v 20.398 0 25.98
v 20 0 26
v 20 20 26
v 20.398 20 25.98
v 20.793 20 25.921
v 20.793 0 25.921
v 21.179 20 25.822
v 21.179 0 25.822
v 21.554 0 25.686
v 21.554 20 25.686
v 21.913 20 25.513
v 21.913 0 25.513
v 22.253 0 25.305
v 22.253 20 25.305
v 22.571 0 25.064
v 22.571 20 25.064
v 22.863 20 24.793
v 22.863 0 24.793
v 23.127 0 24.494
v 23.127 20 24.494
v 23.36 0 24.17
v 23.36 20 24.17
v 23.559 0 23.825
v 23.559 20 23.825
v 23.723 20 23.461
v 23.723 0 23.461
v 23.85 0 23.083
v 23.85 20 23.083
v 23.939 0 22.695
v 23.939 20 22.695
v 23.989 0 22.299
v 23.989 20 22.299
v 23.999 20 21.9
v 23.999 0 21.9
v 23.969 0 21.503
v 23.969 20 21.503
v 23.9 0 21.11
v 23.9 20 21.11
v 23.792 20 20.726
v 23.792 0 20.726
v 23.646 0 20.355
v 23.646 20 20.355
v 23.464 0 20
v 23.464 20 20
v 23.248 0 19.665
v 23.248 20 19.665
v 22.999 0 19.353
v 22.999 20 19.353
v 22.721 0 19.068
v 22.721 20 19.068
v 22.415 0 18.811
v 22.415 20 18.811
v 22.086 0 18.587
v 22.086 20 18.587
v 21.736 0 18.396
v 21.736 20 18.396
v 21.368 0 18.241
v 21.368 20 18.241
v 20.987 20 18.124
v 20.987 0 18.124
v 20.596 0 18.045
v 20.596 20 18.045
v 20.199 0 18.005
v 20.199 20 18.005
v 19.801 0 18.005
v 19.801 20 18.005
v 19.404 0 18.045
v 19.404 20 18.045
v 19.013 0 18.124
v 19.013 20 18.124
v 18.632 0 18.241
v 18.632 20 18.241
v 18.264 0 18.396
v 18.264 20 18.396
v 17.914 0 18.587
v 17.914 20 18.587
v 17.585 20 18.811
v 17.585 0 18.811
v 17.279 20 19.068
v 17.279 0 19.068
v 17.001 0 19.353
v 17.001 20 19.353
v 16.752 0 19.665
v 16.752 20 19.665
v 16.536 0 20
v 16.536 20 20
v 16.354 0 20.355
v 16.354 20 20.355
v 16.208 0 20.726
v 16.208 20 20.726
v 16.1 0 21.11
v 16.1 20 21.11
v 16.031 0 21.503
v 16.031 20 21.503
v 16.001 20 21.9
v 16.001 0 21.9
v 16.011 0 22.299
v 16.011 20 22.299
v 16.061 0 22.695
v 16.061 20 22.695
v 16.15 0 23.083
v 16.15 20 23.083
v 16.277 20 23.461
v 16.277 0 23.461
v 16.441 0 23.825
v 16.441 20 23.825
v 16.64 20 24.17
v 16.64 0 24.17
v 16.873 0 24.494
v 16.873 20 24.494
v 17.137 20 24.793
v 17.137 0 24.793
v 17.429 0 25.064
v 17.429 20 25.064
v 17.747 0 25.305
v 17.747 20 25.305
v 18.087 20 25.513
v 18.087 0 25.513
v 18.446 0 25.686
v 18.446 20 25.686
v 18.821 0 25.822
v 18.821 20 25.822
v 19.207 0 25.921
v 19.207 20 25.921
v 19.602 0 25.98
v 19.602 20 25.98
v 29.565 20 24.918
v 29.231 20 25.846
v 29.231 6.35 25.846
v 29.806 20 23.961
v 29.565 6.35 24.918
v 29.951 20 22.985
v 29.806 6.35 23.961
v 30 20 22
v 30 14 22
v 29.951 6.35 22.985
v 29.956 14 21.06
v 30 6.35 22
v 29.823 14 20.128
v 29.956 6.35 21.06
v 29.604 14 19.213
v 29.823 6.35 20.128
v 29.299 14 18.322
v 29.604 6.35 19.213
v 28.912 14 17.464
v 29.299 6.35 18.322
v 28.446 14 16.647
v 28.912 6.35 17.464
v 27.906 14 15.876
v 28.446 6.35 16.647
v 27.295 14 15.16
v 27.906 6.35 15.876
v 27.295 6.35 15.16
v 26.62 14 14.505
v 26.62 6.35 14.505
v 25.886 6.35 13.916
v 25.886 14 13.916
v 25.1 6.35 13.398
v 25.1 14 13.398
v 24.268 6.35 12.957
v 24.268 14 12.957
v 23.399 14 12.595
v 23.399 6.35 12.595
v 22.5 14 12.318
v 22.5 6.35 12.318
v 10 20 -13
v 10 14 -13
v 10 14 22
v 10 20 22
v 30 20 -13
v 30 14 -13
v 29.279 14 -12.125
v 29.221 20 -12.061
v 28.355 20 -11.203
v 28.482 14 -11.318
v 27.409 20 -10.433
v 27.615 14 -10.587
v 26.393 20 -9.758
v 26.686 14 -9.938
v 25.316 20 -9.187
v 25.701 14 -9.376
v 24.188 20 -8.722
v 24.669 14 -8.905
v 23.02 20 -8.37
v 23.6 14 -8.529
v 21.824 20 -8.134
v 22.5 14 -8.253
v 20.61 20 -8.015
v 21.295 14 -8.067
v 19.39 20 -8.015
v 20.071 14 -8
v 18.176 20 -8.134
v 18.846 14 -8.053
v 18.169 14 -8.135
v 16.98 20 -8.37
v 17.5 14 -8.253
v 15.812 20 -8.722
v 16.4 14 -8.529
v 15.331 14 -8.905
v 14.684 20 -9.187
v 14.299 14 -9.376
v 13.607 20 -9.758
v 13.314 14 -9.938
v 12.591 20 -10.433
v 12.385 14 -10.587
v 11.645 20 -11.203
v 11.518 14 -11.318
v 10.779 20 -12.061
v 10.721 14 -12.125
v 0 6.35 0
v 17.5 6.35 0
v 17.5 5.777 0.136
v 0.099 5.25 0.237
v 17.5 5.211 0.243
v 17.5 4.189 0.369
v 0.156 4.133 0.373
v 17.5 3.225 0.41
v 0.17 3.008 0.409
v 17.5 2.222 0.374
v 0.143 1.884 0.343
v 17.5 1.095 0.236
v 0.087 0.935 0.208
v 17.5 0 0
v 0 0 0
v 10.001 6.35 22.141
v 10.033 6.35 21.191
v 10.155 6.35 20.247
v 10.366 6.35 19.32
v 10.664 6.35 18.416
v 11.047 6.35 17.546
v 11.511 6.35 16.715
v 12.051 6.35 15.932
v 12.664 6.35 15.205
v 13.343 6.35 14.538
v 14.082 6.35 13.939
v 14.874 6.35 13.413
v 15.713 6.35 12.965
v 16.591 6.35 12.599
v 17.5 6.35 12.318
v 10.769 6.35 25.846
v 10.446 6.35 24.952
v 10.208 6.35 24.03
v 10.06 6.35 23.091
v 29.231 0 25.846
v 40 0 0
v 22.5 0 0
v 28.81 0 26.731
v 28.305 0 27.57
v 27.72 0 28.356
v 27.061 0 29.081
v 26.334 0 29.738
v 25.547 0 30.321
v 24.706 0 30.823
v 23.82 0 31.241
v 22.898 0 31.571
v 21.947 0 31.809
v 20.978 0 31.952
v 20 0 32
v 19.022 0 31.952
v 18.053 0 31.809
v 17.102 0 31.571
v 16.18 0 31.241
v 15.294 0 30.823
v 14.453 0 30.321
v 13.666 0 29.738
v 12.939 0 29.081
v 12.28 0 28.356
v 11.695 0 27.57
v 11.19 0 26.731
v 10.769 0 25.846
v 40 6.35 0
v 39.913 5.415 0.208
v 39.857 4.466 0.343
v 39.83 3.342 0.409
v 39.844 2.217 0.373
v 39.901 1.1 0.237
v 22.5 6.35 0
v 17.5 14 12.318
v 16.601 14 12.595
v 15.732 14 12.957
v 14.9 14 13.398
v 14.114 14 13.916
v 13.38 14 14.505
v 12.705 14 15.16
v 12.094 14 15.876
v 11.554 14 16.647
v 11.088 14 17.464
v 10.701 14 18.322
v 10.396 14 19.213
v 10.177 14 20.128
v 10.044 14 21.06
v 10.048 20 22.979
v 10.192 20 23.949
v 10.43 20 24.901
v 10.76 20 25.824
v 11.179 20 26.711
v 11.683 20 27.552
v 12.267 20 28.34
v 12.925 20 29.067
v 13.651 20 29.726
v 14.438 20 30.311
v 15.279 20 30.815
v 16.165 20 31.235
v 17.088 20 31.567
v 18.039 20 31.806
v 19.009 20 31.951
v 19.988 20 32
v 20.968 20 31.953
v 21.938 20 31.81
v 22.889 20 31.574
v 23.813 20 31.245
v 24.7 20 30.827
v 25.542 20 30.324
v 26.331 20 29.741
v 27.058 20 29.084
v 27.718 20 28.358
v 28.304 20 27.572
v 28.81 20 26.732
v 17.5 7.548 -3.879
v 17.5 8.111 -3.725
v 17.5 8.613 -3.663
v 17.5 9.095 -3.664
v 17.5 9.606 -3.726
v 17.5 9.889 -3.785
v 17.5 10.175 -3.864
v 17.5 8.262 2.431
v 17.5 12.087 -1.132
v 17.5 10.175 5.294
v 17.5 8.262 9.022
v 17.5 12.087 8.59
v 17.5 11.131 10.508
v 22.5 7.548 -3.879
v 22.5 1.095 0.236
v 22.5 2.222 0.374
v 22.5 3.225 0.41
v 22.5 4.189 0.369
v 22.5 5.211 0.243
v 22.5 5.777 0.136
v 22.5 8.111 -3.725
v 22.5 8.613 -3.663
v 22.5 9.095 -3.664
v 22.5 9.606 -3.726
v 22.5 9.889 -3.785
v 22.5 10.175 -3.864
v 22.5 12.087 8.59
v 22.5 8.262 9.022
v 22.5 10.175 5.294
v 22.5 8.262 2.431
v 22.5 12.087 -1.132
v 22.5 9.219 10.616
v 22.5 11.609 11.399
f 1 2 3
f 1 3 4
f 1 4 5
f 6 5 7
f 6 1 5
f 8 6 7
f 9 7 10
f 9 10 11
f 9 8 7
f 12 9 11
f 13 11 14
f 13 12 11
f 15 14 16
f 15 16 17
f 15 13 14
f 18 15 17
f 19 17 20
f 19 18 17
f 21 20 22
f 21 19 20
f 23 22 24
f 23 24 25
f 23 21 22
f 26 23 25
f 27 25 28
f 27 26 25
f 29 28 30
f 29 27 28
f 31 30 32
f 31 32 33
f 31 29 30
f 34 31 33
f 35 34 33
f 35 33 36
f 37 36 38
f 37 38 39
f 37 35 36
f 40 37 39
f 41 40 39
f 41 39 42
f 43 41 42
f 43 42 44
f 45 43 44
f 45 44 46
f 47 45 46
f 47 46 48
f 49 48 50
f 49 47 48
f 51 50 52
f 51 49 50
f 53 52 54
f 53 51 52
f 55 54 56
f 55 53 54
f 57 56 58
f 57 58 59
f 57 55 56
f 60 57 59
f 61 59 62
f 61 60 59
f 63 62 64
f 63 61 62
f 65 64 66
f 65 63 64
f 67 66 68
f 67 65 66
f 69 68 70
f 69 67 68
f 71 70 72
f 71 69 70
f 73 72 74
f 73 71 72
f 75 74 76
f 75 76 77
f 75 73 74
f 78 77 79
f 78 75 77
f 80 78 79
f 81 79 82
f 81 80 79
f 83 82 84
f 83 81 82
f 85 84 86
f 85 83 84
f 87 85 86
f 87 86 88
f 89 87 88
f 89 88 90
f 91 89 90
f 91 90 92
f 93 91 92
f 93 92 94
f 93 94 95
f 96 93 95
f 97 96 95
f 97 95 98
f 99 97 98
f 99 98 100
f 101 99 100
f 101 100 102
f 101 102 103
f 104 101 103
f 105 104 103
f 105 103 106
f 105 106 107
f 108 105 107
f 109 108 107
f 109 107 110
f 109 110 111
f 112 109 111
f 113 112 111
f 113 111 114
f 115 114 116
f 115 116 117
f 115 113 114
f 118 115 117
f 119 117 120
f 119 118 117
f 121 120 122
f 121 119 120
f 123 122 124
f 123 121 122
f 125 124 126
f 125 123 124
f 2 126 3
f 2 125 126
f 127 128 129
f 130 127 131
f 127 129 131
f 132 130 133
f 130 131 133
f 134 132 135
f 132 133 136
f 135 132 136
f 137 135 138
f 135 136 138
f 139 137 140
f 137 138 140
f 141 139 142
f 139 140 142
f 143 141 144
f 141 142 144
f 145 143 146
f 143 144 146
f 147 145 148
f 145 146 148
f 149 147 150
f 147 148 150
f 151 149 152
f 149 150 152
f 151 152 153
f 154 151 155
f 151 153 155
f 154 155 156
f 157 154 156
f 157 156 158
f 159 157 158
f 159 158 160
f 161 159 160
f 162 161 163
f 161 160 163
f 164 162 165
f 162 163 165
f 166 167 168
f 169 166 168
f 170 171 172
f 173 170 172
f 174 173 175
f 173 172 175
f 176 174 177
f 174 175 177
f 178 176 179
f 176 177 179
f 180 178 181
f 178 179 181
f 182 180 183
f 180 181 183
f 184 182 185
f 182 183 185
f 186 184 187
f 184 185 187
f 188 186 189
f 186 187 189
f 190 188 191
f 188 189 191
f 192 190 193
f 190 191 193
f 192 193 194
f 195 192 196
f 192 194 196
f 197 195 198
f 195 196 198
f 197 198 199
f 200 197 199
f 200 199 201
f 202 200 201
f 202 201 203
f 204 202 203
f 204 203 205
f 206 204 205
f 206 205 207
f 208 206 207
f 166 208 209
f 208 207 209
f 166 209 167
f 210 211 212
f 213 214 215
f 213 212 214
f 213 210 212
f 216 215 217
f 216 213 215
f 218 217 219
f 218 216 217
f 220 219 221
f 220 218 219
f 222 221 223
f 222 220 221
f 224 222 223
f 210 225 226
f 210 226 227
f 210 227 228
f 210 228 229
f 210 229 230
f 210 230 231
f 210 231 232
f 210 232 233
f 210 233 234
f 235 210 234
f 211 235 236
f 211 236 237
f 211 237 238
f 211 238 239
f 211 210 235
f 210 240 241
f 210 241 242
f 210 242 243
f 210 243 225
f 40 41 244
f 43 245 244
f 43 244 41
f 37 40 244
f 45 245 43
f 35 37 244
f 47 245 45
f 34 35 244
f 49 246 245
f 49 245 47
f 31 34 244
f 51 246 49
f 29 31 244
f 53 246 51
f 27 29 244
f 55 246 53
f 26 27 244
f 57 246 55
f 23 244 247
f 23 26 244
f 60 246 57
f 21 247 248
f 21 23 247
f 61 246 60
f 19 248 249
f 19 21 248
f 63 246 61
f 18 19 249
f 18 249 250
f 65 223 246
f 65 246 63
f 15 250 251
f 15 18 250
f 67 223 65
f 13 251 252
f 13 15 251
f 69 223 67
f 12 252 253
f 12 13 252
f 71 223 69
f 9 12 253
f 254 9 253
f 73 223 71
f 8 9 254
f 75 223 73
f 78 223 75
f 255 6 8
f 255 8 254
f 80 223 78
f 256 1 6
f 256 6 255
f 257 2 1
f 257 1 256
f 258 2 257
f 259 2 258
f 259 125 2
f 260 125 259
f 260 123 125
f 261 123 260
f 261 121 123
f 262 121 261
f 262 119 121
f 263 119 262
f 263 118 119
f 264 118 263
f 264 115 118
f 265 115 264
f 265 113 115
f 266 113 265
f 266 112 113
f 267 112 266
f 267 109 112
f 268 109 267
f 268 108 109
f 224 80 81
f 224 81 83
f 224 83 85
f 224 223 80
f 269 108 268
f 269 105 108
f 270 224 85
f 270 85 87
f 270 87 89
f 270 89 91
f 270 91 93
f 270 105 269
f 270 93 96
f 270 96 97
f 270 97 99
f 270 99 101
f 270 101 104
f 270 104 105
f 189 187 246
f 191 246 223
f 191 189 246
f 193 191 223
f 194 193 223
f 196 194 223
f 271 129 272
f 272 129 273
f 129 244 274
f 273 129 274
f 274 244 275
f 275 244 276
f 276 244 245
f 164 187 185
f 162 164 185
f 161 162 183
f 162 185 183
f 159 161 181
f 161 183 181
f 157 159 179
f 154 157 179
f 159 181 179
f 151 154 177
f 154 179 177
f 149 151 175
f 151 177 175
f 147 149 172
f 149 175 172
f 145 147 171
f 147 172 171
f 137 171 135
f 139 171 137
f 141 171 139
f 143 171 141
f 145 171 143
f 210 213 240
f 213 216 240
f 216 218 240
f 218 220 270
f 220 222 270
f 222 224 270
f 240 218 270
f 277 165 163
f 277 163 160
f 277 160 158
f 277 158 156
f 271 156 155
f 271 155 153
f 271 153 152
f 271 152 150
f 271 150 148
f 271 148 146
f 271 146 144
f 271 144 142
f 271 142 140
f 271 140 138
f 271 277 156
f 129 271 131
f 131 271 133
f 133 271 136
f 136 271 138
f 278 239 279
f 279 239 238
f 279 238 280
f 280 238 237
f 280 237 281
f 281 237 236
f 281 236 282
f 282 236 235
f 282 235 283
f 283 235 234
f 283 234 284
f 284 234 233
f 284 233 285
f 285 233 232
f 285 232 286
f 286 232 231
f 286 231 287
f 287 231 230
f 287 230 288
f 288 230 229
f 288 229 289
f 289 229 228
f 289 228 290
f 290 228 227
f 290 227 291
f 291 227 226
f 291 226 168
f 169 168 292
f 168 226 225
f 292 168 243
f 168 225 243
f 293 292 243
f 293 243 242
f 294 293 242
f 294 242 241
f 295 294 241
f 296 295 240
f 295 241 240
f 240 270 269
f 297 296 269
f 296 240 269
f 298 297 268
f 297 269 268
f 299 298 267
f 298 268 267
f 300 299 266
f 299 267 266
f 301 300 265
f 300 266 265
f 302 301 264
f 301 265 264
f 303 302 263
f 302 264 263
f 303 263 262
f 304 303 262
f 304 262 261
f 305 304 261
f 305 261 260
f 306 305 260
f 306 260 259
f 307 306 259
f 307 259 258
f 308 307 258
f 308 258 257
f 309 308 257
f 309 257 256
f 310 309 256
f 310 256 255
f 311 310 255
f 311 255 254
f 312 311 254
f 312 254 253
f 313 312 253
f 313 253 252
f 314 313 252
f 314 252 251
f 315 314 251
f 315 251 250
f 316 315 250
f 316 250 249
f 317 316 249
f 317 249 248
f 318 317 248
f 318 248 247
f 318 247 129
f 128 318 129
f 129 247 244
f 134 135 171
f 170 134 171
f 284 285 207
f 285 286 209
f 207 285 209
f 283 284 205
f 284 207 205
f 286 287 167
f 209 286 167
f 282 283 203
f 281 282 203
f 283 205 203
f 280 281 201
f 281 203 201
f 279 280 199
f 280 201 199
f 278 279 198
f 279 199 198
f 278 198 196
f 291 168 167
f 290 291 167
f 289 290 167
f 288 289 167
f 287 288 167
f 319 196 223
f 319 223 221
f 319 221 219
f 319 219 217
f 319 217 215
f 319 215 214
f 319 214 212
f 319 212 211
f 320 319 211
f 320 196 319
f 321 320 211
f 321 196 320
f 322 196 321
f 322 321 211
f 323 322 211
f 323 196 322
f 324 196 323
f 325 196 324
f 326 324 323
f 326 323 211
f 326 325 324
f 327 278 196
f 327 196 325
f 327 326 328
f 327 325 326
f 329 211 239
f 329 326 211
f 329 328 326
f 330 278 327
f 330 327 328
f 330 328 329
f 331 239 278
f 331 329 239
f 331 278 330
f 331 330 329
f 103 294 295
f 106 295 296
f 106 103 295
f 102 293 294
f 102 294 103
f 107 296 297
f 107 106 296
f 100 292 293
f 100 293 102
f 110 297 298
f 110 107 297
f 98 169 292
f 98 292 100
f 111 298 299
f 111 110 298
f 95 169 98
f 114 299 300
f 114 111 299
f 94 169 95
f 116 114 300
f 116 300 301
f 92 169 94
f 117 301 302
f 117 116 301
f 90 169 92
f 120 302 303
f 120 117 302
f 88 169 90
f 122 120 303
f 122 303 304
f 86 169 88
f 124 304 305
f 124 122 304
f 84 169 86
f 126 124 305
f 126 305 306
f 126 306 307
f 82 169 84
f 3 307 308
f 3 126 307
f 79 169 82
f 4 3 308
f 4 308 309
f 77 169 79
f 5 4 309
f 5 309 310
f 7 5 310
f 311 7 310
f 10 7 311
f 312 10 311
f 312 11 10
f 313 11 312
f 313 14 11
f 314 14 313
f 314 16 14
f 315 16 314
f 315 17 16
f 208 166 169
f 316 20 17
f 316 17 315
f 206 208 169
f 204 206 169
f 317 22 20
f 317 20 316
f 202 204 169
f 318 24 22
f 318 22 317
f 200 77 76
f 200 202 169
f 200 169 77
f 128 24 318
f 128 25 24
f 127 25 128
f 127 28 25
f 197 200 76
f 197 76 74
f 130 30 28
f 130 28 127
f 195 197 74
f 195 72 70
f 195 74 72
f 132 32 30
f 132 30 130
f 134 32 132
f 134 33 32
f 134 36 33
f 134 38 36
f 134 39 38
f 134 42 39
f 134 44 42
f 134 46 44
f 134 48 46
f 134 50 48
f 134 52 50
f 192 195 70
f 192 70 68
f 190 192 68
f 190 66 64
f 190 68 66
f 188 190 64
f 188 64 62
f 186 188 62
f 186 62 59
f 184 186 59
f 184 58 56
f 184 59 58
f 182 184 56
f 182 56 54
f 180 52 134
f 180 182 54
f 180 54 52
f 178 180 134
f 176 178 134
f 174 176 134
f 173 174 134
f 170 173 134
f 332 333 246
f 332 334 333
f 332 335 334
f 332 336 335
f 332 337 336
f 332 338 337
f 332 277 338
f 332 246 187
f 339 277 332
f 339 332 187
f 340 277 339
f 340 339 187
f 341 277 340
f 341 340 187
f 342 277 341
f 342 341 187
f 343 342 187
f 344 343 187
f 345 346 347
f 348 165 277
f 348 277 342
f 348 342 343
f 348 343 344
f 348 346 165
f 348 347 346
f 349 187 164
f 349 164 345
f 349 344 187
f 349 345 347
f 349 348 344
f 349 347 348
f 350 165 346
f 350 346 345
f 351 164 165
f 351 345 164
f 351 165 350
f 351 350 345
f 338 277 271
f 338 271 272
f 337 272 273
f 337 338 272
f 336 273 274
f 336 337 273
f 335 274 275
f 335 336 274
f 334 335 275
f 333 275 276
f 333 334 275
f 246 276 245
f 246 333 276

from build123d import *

# Parameters (mm, degrees)
BOSS_EXTRUDE1_DEPTH = 6.35
SKETCH1_3_R         = 4
BOSS_EXTRUDE2_DEPTH = 20
SKETCH2_R           = 12.5
CUT_EXTRUDE1_DEPTH  = 55.990908339
BOSS_EXTRUDE3_START = -6
BOSS_EXTRUDE3_DEPTH = 6


with BuildPart() as part:
    # Sketch1 → Boss-Extrude1 (new body)
    with BuildSketch(Plane(origin=(0, 0, 0), x_dir=(1, 0, 0), z_dir=(0, 1, 0))):
        with BuildLine():
            Line((40, 0), (0, 0))
            Line((0, 0), (10.769230769, -25.846153846))
            ThreePointArc((10.769230769, -25.846153846), (18.038838649, -12.194193243), (30, -22))
            ThreePointArc((30, -22), (29.805806757, -23.961161351), (29.230769231, -25.846153846))
            Line((29.230769231, -25.846153846), (40, 0))
        make_face()
    extrude(amount=BOSS_EXTRUDE1_DEPTH)

    # Sketch1<3> → Boss-Extrude2 (add)
    with BuildSketch(Plane(origin=(0, 0, 0), x_dir=(1, 0, 0), z_dir=(0, 1, 0))):
        with BuildLine():
            ThreePointArc((30, -22), (18.038838649, -12.194193243), (10.769230769, -25.846153846))
            ThreePointArc((10.769230769, -25.846153846), (20, -32), (29.230769231, -25.846153846))
            ThreePointArc((29.230769231, -25.846153846), (29.805806757, -23.961161351), (30, -22))
        make_face()
        with Locations((20, -22)):
            Circle(SKETCH1_3_R, mode=Mode.SUBTRACT)
    extrude(amount=BOSS_EXTRUDE2_DEPTH)

    # Sketch2 → Cut-Extrude1 (cut, through all)
    with BuildSketch(Plane(origin=(0, 0, 0), x_dir=(0, 0, -1), z_dir=(1, 0, 0))):
        with Locations((12.090052729, 3.175)):
            Circle(SKETCH2_R)
    extrude(amount=CUT_EXTRUDE1_DEPTH, mode=Mode.SUBTRACT)

    # Sketch3 → Boss-Extrude3 (add)
    with BuildSketch(Plane(origin=(0, 20, 0), x_dir=(1, 0, 0), z_dir=(0, 1, 0)).offset(BOSS_EXTRUDE3_START)):
        with BuildLine():
            Line((10, 13), (10, -22))
            ThreePointArc((10, -22), (20, -12), (30, -22))
            Line((30, -22), (30, 13))
            ThreePointArc((30, 13), (20, 8), (10, 13))
        make_face()
    extrude(amount=BOSS_EXTRUDE3_DEPTH)

    # Sketch5 for Loft1 → Loft1 section 0
    with BuildSketch(Plane.XZ):
        with BuildLine():
            Line((22.5, 0), (17.5, 0))
            Line((17.5, 0), (17.5, 12.317541634))
            # circular arc as an exact rational Bezier (weights 1, cos(half-angle), 1)
            Bezier((17.5, 12.317541634), (20, 11.67204441), (22.5, 12.317541634), weights=[1, 0.968245837, 1])
            Line((22.5, 12.317541634), (22.5, 0))
        make_face()
    # Sketch4 for Loft1 → Loft1 section 1
    with BuildSketch(Plane.XZ.offset(-14)):
        with BuildLine():
            Line((17.5, -8.252551286), (17.5, 12.317541634))
            Bezier((17.5, 12.317541634), (20, 11.67204441), (22.5, 12.317541634), weights=[1, 0.968245837, 1])
            Line((22.5, 12.317541634), (22.5, -8.252551286))
            Bezier((22.5, -8.252551286), (20, -7.742240923), (17.5, -8.252551286), weights=[1, 0.979795897, 1])
        make_face()
    loft()


solid = part.part
